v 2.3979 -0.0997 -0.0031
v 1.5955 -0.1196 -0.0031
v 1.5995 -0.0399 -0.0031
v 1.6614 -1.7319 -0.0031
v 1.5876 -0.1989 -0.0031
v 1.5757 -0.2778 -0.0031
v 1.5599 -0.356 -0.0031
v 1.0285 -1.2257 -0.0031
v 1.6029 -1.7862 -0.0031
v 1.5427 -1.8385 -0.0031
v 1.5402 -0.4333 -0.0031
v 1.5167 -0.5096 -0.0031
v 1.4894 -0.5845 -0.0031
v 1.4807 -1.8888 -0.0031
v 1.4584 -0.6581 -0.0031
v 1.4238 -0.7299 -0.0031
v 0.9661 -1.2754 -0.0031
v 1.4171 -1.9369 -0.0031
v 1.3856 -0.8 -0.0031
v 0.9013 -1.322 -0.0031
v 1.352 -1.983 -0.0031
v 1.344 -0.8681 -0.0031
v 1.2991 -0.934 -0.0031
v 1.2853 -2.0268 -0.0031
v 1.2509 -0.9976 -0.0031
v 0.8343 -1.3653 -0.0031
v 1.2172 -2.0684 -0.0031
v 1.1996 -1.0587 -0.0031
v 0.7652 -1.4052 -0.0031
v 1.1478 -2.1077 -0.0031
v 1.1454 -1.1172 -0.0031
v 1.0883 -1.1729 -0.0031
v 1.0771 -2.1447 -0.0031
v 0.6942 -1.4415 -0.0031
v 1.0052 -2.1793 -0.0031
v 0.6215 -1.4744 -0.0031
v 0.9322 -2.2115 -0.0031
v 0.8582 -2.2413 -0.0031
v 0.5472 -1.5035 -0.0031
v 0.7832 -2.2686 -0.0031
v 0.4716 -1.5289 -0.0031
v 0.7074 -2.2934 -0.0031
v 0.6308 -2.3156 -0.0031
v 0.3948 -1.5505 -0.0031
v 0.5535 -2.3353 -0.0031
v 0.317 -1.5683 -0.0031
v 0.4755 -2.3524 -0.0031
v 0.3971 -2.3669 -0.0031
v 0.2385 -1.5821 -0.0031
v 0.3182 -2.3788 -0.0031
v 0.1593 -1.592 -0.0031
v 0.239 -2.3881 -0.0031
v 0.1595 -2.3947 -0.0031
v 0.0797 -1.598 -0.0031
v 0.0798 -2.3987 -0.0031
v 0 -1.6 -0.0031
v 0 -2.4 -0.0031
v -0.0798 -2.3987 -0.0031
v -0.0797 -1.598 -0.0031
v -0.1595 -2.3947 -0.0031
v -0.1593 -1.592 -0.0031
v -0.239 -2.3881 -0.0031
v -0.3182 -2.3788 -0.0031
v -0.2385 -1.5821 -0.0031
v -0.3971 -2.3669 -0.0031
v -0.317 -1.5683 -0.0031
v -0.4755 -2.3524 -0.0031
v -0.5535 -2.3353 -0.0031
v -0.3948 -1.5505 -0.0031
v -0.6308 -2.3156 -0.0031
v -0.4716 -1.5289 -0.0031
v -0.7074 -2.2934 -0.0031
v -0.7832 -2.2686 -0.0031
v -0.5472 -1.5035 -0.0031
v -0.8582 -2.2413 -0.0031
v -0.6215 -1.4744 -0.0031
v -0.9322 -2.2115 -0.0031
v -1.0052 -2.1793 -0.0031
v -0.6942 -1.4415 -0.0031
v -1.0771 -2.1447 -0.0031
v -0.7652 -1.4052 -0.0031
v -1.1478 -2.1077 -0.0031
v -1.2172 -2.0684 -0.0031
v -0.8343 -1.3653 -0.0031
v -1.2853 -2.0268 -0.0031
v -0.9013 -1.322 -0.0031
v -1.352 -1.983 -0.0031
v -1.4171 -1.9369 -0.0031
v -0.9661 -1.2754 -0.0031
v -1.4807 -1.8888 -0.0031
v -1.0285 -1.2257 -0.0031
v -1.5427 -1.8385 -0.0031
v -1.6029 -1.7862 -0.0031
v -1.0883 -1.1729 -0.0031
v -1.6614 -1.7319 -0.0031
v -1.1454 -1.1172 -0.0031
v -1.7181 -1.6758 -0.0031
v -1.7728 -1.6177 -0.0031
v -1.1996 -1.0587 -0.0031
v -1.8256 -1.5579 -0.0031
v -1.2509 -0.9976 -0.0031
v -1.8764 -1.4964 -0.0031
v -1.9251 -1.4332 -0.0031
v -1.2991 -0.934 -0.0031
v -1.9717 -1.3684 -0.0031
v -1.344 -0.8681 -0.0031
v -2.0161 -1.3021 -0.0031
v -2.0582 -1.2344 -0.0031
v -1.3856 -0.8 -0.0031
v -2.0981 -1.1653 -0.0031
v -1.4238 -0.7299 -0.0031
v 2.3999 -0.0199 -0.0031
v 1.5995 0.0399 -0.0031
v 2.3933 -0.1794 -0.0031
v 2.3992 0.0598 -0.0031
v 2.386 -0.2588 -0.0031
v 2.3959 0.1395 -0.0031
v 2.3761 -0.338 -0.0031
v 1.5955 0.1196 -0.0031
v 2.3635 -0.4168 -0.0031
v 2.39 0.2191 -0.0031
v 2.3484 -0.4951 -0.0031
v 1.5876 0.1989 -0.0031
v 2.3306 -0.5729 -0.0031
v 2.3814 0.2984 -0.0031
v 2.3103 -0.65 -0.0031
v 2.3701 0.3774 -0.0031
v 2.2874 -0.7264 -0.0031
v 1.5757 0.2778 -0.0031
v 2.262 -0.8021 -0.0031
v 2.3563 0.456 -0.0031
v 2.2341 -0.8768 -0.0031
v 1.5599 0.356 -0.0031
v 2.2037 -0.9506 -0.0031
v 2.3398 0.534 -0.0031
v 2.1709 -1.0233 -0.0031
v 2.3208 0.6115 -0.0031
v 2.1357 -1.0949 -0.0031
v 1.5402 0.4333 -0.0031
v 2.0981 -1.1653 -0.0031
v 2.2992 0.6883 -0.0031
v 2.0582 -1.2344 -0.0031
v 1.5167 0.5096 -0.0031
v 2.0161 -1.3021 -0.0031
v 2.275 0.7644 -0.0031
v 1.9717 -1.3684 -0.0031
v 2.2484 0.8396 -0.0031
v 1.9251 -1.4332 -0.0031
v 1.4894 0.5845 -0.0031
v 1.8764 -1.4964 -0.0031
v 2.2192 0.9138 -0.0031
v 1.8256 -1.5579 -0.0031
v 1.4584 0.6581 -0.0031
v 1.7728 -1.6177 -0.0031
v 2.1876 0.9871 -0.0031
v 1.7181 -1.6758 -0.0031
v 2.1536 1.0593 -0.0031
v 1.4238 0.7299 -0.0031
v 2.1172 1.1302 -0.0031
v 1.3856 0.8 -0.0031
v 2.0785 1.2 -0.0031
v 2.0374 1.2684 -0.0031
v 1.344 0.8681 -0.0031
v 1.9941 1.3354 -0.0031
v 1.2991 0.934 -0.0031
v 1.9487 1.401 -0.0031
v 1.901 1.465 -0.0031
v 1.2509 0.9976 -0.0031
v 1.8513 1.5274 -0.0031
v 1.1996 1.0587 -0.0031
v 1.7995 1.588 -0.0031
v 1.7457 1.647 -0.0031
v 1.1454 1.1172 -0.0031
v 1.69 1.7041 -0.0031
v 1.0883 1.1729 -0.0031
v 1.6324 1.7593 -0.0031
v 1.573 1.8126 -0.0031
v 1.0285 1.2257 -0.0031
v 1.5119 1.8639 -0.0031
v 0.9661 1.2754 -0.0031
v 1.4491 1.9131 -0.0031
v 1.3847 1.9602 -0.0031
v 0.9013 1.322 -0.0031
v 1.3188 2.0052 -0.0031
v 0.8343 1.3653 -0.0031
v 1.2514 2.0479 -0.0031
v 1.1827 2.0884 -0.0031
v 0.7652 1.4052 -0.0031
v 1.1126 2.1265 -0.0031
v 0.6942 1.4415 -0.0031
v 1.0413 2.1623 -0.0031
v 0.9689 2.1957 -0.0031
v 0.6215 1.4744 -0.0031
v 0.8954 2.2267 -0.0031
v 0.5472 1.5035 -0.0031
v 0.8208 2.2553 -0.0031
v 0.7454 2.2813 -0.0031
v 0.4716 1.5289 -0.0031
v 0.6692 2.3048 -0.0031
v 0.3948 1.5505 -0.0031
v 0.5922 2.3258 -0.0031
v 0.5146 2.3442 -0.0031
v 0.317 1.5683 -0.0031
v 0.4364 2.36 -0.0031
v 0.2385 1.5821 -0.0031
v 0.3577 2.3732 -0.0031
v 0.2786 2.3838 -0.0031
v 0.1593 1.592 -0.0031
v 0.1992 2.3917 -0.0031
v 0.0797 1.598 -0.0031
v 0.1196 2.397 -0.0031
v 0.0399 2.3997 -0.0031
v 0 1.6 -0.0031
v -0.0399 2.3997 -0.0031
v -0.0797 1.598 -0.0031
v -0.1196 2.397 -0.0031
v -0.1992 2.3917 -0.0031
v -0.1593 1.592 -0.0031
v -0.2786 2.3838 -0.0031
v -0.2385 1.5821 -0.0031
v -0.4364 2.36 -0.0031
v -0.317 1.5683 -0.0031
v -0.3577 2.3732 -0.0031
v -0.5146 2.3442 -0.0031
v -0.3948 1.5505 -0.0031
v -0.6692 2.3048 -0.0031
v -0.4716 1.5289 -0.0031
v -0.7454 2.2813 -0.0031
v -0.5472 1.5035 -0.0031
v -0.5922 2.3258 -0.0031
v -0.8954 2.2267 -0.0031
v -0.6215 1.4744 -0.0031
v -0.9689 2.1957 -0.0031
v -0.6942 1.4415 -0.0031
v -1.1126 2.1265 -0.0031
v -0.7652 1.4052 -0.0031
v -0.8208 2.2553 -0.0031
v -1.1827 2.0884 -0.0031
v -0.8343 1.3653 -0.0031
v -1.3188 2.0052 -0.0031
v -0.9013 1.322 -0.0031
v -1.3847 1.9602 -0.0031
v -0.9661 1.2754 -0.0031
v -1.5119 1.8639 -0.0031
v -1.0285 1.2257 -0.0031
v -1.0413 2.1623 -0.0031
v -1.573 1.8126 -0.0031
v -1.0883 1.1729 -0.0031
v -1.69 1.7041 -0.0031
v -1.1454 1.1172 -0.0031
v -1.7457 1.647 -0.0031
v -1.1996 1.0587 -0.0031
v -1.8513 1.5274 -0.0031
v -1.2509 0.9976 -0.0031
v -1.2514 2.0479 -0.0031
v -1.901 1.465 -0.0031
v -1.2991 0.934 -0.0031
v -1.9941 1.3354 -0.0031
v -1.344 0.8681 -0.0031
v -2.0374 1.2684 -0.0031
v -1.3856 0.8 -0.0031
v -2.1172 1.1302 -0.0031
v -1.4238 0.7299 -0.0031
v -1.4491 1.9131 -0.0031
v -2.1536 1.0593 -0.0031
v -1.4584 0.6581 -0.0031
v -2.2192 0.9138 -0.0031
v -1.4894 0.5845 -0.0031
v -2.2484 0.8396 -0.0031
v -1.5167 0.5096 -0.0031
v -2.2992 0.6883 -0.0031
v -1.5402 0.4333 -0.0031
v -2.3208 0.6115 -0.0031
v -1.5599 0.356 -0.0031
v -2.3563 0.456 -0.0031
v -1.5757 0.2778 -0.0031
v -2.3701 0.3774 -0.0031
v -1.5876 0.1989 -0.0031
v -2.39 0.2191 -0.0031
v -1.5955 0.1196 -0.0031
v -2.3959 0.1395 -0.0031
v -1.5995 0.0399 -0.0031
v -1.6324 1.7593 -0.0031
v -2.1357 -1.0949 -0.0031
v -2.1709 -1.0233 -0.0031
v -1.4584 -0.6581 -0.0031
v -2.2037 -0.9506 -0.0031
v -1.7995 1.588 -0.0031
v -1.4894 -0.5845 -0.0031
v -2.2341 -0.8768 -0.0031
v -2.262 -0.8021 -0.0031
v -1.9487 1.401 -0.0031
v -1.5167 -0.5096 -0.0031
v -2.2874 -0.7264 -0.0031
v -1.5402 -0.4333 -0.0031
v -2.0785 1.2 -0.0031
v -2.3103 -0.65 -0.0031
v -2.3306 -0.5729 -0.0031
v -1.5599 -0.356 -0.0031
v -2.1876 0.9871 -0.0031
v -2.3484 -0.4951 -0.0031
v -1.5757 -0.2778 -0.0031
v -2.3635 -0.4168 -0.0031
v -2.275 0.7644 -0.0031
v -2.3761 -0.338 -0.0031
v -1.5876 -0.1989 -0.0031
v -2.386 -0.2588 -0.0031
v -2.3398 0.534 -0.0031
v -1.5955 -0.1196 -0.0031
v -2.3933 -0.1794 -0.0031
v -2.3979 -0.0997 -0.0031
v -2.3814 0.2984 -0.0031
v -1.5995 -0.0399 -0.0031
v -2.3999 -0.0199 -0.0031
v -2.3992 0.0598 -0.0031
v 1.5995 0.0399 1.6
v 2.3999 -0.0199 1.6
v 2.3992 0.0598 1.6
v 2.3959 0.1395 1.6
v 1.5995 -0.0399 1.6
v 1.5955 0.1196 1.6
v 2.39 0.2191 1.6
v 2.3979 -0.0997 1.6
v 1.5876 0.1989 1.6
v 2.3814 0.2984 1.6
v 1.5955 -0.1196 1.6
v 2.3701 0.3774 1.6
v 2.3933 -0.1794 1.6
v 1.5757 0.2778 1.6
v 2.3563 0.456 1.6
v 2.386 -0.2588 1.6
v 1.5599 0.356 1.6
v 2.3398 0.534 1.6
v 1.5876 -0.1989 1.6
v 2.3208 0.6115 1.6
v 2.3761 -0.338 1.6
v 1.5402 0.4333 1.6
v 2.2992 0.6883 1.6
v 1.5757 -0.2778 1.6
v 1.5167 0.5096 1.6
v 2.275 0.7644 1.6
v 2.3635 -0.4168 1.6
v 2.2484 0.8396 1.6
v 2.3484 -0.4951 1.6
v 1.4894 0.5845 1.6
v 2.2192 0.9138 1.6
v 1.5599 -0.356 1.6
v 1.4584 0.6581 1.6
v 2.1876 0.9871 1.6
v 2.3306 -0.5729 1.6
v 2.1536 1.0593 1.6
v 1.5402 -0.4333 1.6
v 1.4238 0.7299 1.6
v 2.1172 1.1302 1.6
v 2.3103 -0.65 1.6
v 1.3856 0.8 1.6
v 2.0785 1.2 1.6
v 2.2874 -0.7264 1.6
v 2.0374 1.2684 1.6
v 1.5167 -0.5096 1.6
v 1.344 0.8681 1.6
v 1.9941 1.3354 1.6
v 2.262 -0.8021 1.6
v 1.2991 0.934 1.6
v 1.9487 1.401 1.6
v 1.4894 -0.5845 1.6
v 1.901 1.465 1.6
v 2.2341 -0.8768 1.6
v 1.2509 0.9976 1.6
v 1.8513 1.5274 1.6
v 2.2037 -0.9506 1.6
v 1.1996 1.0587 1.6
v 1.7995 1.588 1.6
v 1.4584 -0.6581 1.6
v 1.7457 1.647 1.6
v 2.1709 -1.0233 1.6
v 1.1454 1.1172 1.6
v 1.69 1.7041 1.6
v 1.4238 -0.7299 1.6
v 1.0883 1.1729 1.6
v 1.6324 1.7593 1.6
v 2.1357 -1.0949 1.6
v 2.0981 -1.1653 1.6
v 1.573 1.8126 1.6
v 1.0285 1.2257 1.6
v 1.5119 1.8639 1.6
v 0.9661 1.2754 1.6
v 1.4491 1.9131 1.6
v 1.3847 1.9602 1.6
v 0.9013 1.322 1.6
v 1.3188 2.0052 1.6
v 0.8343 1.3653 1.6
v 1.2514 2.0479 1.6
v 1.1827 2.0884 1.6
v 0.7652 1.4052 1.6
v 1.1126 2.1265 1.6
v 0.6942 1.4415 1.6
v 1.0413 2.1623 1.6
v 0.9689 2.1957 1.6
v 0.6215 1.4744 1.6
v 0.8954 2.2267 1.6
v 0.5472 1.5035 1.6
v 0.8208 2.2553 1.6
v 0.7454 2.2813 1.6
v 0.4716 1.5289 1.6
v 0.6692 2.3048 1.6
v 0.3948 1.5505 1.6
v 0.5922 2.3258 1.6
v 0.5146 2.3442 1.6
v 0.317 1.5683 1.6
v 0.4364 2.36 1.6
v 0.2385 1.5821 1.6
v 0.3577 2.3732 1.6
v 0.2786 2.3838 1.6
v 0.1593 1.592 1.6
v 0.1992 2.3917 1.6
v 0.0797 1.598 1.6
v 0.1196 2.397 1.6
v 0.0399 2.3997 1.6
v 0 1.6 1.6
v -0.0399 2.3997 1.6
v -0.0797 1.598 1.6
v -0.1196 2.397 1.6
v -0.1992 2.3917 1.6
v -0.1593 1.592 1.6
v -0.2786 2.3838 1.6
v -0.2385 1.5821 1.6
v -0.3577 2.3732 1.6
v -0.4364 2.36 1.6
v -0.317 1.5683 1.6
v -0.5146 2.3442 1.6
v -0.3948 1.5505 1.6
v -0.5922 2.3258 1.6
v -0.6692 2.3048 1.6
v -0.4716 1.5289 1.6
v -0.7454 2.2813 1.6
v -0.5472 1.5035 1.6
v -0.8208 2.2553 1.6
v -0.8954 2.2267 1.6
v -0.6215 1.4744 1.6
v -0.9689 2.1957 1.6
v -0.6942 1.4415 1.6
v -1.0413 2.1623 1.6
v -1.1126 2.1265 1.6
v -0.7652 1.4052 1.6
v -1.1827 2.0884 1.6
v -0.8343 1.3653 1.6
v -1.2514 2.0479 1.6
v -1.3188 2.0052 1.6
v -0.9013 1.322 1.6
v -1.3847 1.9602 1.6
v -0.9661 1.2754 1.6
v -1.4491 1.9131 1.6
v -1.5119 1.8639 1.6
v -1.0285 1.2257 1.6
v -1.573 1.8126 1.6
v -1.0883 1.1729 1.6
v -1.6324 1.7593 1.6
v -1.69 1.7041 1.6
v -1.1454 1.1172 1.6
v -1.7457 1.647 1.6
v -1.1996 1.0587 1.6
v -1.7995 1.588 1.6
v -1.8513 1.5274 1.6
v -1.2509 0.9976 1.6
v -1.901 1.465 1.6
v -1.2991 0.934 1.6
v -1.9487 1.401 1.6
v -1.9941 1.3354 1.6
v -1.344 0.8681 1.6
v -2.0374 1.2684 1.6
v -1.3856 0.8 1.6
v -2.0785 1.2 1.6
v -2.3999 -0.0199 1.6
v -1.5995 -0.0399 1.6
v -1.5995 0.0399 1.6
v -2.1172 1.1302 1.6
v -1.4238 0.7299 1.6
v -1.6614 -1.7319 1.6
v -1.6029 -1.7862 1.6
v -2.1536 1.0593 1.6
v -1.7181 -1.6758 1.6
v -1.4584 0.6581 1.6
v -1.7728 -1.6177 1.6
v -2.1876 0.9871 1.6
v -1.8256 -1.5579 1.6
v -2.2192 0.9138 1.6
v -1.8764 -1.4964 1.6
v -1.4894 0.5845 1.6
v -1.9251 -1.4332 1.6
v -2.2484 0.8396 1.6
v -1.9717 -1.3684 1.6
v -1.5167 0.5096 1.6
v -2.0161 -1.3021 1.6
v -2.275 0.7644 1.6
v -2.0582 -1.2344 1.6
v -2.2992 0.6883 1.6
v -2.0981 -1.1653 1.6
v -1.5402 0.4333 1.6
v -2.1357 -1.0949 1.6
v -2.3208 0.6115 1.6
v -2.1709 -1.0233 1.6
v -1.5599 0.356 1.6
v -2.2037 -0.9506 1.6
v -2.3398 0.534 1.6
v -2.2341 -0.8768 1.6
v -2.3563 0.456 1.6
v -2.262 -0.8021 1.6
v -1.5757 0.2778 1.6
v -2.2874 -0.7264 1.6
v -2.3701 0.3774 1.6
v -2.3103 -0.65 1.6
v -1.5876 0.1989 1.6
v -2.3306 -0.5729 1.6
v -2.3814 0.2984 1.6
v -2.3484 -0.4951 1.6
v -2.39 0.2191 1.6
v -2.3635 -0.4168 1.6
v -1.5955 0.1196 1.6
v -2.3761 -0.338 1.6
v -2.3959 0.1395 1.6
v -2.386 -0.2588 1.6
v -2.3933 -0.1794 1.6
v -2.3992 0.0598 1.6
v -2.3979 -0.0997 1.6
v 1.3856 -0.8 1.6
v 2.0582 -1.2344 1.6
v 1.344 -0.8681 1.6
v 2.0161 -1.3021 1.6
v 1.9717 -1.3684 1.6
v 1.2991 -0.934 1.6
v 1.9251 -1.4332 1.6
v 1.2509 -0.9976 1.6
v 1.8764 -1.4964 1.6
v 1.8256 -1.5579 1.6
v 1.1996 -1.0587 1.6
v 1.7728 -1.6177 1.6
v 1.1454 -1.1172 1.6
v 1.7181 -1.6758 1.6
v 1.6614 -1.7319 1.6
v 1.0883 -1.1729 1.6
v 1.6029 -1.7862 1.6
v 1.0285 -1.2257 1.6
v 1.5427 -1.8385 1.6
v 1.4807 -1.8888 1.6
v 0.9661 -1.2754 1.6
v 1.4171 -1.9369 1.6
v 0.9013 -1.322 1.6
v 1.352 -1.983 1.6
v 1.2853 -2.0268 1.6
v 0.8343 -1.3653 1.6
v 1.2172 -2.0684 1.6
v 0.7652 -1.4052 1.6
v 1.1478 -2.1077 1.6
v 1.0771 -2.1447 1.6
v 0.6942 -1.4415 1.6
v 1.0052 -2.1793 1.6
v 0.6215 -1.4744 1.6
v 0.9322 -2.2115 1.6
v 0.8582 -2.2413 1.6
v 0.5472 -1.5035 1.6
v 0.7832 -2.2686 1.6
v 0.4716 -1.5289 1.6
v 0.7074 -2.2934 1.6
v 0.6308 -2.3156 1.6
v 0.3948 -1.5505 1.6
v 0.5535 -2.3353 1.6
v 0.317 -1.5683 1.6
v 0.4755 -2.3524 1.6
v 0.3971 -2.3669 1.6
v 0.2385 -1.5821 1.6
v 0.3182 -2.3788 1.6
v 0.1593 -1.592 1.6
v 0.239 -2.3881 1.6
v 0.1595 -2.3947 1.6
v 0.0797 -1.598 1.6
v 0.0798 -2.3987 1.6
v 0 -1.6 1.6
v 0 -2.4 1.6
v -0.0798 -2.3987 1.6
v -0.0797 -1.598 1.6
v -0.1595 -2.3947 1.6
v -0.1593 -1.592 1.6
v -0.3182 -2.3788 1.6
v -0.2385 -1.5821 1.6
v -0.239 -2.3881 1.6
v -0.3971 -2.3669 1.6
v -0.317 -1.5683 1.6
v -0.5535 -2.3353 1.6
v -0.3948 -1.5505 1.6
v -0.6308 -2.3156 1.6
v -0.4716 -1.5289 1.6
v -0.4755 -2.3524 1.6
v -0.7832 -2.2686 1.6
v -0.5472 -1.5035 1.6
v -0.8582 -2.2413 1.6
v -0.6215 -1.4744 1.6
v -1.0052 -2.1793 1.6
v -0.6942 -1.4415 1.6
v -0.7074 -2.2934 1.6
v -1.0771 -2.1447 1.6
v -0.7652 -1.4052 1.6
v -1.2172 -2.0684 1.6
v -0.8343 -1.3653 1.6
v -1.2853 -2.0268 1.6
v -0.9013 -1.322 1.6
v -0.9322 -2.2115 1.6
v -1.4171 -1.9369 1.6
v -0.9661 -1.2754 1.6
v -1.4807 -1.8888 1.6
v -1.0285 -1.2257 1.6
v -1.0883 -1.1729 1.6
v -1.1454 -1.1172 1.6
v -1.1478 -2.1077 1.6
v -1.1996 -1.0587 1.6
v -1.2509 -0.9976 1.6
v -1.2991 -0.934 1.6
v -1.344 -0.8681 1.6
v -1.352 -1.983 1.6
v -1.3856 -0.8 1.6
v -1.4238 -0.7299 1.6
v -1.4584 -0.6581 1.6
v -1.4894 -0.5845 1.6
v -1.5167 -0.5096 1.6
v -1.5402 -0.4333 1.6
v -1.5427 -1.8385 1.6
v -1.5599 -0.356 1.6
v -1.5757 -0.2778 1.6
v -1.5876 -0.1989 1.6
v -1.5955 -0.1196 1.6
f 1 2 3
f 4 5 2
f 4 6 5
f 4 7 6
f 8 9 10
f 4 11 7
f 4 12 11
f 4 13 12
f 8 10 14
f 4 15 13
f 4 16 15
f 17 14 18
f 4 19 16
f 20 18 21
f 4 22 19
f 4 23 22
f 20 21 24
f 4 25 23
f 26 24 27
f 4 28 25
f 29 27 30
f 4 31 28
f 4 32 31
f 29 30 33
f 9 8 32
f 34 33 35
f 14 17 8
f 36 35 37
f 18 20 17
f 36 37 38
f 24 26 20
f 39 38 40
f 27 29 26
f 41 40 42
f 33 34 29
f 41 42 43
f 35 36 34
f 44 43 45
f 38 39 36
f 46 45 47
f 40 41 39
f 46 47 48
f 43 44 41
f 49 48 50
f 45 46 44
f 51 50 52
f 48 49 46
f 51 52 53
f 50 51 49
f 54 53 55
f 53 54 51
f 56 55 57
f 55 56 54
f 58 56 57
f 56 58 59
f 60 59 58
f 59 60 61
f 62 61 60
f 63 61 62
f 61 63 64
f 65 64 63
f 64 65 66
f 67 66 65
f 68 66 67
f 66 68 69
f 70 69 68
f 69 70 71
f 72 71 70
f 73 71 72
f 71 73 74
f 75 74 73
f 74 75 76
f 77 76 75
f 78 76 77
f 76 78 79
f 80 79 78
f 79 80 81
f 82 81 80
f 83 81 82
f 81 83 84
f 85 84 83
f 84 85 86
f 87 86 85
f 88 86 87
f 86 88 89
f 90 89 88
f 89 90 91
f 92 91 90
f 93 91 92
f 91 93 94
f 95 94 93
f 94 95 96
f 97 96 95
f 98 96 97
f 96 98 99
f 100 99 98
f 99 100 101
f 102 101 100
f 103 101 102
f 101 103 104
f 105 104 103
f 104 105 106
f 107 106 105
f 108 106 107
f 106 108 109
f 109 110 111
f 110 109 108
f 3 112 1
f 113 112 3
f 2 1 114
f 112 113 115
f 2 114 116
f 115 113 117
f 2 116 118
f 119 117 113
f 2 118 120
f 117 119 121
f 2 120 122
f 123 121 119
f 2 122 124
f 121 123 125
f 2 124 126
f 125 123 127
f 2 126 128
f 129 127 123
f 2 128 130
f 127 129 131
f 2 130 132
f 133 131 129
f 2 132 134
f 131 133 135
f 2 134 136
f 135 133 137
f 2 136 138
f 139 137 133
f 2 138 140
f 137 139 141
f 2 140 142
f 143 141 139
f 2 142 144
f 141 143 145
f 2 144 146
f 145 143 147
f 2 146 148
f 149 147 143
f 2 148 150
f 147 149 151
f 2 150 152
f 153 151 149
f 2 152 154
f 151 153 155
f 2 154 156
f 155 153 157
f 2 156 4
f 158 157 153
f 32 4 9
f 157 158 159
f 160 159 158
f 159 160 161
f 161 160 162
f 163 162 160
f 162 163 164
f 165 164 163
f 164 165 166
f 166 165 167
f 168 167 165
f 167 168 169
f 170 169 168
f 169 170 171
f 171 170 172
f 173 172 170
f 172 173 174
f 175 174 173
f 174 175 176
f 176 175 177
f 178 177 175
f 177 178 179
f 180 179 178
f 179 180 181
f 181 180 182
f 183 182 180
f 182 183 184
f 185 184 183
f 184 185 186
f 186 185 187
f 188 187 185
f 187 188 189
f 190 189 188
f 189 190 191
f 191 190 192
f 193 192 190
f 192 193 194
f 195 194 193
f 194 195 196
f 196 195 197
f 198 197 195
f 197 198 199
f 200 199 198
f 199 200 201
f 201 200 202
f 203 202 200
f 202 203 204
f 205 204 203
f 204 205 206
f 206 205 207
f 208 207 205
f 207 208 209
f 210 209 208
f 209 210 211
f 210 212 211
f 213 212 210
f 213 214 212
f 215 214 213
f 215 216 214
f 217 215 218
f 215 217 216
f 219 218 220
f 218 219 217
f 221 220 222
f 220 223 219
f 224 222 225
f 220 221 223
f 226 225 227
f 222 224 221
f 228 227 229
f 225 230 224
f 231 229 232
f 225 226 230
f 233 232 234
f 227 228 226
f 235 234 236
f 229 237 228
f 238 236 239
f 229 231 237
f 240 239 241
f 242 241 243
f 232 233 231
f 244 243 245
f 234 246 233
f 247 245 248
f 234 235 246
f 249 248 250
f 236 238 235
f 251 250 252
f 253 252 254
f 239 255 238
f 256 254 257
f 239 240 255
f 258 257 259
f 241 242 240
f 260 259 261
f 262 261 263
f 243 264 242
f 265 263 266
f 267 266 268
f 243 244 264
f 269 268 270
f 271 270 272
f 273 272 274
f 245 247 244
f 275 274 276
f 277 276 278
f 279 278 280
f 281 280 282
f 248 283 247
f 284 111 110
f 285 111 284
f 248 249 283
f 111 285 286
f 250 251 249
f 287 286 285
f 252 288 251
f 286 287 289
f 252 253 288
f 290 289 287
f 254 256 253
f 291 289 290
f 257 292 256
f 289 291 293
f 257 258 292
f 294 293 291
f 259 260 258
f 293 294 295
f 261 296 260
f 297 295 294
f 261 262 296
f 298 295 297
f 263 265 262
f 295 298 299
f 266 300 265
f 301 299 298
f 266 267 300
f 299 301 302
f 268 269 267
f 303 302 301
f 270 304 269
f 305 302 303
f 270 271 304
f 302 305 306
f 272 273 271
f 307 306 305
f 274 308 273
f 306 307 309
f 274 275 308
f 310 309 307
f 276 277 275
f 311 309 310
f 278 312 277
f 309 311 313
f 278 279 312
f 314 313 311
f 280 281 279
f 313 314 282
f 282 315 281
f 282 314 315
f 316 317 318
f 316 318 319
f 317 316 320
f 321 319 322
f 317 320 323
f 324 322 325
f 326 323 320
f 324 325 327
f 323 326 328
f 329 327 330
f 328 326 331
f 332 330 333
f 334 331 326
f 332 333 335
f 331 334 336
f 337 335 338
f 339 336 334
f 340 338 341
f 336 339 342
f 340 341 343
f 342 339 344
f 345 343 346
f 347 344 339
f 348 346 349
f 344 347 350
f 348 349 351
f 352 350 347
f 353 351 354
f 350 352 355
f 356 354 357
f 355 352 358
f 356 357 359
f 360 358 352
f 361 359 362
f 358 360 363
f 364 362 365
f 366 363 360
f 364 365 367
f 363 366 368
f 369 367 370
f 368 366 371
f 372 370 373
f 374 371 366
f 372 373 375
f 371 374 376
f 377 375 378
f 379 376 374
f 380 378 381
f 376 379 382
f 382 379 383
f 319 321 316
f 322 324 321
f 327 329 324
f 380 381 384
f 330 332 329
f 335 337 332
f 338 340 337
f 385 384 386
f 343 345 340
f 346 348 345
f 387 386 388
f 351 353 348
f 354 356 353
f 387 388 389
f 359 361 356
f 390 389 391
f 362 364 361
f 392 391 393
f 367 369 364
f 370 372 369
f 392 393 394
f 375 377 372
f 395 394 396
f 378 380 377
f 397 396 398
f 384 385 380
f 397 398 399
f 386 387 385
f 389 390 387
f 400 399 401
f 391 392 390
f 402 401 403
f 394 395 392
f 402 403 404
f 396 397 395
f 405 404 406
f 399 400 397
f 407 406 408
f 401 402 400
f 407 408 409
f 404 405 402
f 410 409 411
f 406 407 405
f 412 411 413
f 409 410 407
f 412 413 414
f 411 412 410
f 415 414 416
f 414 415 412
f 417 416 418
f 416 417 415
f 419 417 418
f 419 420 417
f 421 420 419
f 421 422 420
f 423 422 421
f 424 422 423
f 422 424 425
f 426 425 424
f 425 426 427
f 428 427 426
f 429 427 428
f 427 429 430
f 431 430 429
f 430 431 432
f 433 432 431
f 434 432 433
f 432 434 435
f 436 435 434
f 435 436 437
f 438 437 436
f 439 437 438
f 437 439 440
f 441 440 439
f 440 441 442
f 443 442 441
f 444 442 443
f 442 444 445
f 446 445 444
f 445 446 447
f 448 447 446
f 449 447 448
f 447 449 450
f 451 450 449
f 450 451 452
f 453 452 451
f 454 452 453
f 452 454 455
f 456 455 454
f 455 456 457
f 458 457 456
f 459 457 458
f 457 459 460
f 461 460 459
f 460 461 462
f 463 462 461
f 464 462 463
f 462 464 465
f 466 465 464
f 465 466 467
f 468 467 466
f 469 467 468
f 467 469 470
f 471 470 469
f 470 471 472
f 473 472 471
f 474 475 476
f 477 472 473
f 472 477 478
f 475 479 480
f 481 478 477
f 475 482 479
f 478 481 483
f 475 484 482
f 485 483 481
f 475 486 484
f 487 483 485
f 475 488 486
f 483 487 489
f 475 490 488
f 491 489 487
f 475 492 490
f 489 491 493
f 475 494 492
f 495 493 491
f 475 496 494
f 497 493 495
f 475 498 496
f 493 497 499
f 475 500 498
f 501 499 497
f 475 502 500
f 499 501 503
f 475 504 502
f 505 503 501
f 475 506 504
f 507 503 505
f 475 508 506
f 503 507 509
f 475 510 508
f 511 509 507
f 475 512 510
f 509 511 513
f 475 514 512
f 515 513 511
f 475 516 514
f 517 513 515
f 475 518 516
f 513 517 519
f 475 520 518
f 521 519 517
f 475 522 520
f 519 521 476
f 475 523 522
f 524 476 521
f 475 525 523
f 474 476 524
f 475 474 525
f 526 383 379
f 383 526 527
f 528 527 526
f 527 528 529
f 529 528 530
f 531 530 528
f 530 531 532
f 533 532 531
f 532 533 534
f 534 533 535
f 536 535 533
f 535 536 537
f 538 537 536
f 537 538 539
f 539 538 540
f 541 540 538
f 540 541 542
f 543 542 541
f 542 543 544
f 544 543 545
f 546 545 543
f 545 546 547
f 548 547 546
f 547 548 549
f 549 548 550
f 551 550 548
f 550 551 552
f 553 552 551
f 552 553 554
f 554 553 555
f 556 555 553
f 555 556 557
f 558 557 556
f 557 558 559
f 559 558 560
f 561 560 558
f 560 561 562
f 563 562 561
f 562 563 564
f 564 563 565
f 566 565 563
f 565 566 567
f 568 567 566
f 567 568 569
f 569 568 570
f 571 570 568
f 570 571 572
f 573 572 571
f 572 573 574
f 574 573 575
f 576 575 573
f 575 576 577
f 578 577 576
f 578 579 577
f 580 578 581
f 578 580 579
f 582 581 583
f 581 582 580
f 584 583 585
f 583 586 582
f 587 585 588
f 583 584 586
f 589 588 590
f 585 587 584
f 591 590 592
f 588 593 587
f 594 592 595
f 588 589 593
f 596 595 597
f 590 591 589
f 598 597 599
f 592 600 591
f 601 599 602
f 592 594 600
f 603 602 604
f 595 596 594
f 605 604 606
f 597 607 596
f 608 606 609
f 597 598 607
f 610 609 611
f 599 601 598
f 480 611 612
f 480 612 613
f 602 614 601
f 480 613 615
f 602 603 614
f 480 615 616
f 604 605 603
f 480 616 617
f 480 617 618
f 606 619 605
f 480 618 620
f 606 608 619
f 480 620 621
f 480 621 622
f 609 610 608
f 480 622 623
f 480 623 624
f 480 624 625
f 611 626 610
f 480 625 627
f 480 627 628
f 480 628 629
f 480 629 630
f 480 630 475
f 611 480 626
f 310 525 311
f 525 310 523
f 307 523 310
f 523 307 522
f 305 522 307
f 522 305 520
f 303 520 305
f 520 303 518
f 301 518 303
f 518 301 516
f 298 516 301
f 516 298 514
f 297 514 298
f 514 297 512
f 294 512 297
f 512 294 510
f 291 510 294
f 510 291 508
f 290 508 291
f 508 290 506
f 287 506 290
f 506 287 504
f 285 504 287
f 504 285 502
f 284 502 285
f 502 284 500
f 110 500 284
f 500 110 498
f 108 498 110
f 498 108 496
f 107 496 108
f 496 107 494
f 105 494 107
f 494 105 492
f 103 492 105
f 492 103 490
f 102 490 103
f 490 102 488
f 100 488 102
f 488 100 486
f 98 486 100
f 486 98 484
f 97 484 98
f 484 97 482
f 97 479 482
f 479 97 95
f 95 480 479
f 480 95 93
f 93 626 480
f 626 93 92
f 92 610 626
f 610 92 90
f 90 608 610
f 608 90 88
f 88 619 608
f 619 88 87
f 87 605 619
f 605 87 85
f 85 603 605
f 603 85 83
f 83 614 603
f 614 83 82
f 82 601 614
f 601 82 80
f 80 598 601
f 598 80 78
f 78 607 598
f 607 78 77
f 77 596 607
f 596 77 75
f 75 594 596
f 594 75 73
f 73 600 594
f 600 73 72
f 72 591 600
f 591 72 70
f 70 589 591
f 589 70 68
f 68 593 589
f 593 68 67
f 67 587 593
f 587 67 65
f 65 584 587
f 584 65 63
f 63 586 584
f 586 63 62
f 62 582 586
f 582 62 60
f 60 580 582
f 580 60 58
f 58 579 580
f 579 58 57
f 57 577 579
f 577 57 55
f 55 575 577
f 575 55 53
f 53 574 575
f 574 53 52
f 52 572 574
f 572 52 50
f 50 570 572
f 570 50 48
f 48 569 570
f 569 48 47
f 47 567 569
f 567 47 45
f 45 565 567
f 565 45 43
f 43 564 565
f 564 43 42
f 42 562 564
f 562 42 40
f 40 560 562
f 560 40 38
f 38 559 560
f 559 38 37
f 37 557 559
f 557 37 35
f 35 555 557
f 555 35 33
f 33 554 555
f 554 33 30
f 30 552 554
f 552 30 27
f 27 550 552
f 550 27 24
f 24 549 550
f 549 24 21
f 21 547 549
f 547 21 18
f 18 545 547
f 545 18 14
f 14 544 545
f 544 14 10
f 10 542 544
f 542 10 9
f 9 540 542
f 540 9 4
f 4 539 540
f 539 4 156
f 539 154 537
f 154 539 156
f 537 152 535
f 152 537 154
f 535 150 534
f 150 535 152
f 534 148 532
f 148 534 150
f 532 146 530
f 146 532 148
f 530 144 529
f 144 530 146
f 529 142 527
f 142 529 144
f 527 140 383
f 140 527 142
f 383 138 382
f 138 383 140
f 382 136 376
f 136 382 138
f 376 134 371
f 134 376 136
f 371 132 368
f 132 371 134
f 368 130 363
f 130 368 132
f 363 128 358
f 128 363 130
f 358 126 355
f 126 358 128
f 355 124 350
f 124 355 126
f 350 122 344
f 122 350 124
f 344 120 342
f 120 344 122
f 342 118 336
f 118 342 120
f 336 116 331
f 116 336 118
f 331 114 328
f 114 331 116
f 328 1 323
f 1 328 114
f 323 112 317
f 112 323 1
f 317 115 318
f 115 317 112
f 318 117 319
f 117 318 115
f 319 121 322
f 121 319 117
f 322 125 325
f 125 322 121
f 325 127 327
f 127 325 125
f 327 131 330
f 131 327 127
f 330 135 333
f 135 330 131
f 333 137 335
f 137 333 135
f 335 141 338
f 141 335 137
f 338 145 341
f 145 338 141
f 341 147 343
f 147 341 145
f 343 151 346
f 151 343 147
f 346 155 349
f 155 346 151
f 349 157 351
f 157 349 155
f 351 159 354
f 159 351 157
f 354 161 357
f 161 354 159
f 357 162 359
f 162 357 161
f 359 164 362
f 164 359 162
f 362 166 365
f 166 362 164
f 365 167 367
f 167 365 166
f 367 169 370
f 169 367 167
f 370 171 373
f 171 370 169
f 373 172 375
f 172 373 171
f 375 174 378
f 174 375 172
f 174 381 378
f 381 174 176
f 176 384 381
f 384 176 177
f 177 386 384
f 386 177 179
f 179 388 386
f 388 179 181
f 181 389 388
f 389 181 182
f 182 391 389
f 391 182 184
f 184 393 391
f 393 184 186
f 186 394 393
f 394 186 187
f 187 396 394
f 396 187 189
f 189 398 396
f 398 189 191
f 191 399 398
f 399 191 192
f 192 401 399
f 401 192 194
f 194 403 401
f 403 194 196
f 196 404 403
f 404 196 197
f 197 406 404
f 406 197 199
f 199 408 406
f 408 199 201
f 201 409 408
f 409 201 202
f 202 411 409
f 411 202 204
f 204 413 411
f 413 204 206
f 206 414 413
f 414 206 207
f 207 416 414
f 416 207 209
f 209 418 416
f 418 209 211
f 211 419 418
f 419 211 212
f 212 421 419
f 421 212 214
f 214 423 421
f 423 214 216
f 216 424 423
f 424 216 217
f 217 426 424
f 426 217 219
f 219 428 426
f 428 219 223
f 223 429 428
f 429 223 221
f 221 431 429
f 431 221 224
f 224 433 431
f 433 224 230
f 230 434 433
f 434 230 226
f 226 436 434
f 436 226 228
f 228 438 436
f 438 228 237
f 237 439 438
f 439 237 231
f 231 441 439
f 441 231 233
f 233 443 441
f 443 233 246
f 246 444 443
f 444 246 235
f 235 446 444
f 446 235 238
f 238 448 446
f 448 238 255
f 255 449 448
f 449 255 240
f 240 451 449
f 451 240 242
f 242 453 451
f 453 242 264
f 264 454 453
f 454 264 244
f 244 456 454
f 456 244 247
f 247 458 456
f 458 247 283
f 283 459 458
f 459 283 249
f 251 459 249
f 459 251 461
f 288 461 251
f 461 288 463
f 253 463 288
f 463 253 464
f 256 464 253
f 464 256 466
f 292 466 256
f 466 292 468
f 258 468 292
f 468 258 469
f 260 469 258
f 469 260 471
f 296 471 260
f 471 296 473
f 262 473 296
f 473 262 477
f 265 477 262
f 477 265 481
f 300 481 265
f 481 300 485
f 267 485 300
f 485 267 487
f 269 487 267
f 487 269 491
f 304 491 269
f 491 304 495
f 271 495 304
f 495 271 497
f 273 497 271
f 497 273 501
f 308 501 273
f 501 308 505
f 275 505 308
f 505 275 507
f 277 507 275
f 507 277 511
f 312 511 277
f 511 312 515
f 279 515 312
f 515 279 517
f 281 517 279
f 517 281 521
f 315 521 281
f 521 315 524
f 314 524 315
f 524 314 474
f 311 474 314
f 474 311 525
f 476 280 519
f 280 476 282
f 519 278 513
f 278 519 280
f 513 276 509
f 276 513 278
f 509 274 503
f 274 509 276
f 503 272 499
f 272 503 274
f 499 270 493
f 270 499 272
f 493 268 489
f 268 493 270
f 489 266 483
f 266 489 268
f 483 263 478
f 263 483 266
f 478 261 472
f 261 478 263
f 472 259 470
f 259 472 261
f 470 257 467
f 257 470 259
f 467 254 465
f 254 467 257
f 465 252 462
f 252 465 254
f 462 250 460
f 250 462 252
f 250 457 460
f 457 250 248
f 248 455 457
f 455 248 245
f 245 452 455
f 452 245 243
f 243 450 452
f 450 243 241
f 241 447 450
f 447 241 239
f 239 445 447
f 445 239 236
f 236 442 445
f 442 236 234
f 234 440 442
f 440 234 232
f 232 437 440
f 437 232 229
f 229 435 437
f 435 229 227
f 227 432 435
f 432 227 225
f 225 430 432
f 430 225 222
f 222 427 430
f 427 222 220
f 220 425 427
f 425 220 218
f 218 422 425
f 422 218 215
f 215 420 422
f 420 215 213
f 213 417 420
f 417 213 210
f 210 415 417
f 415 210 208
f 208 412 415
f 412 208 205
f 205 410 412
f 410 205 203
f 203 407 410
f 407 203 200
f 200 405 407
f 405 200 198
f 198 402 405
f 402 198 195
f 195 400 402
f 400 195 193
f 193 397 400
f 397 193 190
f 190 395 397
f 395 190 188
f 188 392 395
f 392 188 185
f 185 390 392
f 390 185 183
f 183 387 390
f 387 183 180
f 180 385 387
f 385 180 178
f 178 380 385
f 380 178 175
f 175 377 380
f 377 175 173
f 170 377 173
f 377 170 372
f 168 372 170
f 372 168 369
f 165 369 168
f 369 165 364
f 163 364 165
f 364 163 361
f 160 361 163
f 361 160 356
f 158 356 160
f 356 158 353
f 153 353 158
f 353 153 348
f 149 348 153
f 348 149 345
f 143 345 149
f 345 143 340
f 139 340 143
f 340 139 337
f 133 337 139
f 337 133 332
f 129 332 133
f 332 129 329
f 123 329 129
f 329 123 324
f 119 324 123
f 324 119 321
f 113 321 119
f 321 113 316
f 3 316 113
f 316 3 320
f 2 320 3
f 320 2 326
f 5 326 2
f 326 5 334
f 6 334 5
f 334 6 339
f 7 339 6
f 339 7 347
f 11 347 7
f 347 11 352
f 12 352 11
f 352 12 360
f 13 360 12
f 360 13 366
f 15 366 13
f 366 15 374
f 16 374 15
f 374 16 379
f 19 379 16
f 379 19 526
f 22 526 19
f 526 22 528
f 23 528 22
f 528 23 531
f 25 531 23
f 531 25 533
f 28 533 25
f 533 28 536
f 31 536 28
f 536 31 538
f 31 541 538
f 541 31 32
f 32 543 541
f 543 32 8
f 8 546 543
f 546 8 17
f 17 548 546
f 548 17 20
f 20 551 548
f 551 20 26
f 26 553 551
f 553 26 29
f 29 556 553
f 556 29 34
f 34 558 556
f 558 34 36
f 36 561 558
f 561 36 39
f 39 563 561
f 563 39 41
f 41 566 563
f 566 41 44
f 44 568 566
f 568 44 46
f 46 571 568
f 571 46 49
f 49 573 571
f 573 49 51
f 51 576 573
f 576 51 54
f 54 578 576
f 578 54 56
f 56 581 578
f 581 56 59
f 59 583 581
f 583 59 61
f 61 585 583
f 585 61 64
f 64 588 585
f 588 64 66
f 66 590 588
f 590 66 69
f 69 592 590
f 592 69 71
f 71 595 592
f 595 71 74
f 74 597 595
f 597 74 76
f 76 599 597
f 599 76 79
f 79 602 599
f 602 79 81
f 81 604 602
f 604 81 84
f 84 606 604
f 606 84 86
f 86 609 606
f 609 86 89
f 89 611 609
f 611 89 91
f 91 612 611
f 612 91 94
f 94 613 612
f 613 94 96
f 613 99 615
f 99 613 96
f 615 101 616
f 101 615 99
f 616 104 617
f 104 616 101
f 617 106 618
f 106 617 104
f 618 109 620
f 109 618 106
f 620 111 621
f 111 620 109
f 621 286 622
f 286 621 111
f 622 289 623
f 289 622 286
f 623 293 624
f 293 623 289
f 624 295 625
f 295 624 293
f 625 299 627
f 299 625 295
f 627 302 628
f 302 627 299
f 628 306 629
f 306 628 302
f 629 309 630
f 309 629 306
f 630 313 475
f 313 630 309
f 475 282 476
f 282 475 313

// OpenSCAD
use <../lib.scad>
use <193445c.scad>
use <4181.scad>
$fa=1; $fs=0.2;
function ldraw_lib__4181dt1(realsolid=false) = [
// 0 Train Door  1 x  4 x  5 Left with "5590" Sticker
// 0 Name: 4181dt1.dat
// 0 Author: Ulrich Röder [UR]
// 0 !LDRAW_ORG Shortcut UPDATE 2019-01
// 0 !LICENSE Licensed under CC BY 2.0 and CC BY 4.0 : see CAreadme.txt
// 
// 0 BFC CERTIFY CCW
  [0,"BFC","CERTIFY"],
  [0,"BFC","CCW"],
// 
// 0 !KEYWORDS Set 5590
// 
// 0 !HISTORY 2019-06-28 [PTadmin] Official Update 2019-01
// 
// 
// 1 16 0 0 0 1 0 0 0 1 0 0 0 1 4181.dat
  [1,16,0,0,0,1,0,0,0,1,0,0,0,1, ldraw_lib__4181(realsolid)],
// 1 16 10 102 30 0 -1 0 0 0 -1 1 0 0 193445c.dat
  [1,16,10,102,30,0,-1,0,0,0,-1,1,0,0, ldraw_lib__193445c(realsolid)],
];
module ldraw_lib__4181dt1(step=0, col=false, unit=2/5, alt=false, line=0.2, solid=!$preview)
    makepoly(ldraw_lib__4181dt1(solid), step=step, col=col, unit=unit, alt=alt, line=line, solid=solid);
ldraw_lib__4181dt1(line=0.2);
